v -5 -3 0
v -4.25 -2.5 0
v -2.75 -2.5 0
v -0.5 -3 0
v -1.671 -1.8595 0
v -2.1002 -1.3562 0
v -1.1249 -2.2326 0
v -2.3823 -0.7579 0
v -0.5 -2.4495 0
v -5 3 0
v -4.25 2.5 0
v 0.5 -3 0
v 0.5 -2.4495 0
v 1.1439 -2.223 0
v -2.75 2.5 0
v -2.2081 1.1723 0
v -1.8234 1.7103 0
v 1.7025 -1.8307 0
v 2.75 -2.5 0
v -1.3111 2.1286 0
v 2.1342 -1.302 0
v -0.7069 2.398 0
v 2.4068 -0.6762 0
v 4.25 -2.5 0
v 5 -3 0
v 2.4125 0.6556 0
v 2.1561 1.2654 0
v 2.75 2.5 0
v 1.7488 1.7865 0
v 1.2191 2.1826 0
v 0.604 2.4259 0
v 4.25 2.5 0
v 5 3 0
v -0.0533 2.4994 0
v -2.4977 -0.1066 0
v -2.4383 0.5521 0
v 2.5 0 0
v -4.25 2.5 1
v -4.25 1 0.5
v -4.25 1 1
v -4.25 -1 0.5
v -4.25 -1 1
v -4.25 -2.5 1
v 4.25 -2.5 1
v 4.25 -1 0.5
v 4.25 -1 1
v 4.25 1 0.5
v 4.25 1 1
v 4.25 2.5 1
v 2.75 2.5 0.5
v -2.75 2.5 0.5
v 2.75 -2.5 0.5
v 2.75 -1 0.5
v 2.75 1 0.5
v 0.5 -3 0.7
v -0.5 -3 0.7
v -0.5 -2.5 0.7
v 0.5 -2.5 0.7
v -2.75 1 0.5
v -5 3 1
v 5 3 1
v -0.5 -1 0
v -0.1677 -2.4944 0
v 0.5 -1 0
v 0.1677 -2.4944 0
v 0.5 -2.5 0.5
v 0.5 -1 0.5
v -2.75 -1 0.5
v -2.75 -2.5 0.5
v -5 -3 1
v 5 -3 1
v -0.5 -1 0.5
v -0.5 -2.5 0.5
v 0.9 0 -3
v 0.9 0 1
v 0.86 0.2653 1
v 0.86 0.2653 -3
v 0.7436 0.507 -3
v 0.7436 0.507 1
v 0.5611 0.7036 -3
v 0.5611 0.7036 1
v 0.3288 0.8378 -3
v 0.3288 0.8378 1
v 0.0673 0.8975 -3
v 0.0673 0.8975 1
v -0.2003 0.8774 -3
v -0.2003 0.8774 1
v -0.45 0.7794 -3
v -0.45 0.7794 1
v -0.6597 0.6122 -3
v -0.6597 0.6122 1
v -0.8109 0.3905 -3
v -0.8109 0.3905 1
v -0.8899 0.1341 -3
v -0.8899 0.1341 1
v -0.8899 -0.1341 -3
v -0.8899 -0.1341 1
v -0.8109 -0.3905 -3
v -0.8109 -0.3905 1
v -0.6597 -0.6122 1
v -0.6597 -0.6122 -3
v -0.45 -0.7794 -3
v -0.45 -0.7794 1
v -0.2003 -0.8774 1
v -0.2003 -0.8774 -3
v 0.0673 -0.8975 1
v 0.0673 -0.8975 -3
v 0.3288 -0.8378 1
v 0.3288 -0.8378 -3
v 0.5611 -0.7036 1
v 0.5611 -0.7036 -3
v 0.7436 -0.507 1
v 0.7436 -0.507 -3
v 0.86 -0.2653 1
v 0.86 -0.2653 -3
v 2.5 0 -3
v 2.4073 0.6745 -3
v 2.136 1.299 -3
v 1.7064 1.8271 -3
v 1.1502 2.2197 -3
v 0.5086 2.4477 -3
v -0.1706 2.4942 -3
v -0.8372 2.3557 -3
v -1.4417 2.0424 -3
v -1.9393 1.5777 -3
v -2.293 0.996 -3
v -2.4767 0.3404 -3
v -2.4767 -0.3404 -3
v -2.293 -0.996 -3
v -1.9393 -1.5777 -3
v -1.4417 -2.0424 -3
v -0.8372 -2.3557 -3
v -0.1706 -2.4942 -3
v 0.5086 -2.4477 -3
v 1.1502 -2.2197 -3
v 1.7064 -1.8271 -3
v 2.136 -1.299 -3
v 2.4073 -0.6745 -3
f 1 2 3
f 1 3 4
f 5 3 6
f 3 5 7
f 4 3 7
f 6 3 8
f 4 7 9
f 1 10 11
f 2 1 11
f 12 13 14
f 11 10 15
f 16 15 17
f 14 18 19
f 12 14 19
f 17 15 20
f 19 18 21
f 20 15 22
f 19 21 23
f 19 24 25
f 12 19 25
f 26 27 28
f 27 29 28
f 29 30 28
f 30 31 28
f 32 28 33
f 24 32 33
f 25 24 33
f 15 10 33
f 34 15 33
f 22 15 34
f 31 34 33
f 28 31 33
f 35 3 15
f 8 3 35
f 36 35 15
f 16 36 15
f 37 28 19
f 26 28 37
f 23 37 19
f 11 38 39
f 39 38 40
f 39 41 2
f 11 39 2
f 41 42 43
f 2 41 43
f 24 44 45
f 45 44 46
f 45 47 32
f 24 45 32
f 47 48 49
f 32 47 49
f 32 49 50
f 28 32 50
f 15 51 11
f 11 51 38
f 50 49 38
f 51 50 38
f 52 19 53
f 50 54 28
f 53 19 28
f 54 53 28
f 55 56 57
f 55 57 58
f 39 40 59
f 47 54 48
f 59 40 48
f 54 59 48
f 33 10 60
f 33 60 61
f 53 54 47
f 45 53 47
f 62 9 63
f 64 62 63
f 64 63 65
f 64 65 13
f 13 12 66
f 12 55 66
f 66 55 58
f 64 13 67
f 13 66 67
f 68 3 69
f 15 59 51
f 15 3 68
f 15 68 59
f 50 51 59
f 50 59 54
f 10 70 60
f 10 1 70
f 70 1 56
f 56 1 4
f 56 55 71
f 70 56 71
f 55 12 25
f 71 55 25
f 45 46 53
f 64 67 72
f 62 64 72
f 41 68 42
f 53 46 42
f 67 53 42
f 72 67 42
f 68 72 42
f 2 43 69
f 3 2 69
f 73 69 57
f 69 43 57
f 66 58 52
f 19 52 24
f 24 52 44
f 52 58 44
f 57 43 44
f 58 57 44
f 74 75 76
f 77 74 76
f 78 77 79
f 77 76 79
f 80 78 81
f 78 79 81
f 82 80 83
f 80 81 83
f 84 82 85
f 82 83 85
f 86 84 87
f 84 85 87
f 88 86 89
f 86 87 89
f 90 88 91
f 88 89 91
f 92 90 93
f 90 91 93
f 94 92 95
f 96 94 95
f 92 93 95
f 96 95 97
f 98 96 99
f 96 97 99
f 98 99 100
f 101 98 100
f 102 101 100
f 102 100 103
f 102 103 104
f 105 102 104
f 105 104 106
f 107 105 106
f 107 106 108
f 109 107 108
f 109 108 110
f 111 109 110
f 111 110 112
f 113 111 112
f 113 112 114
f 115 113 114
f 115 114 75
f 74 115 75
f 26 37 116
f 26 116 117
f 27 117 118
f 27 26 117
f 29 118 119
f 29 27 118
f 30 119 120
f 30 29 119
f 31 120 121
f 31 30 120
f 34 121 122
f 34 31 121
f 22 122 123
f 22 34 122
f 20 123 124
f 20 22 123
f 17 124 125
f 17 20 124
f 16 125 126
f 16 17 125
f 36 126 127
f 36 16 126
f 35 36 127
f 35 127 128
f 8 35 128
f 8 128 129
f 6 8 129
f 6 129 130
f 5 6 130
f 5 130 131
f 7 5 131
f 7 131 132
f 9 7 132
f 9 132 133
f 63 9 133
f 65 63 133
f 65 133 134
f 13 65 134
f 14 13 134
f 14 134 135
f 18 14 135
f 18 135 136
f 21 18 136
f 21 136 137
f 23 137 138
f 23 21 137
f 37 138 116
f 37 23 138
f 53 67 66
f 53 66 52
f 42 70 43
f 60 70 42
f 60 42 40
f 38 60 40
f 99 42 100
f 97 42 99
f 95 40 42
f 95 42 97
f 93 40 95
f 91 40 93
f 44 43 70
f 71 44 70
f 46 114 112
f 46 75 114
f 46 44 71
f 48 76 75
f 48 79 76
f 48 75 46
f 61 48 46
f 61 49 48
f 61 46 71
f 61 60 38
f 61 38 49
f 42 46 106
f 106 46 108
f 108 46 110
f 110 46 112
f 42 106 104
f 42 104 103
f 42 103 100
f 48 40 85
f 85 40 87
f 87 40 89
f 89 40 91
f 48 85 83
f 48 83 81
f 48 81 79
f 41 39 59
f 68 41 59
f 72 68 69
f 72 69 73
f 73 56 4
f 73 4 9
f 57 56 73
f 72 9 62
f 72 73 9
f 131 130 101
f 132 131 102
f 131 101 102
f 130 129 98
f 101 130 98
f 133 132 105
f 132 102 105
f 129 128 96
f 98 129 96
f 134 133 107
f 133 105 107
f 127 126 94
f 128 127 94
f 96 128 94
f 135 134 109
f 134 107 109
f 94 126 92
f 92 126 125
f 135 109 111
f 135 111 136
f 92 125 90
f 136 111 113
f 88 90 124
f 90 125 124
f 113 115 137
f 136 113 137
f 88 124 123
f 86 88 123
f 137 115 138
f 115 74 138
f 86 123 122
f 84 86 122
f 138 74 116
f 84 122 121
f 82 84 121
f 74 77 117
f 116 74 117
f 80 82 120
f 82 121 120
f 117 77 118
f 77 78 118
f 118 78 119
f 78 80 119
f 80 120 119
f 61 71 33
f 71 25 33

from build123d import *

# Parameters (mm, degrees)
F0_W      = 10
F0_H      = 6
F0_W_2    = 1.5
F0_H_2    = 5
F1_DEPTH  = 0.5
F2_W      = 10
F2_H      = 6
F3_DEPTH  = 0.5
F5_DEPTH  = 0.5
F6_W      = 1
F6_H      = 0.5
F7_DEPTH  = 2
F8_R      = 2.5
F8_R_2    = 0.9
F9_DEPTH  = 3
F10_R     = 0.9
F11_DEPTH = 4.001
F12_DEPTH = 0.2


with BuildPart() as f1:
    # F0 (on Top) → F1 (new body)
    with BuildSketch(Plane.XY):
        Rectangle(F0_W, F0_H)
        with Locations((-3.5, 0)):
            Rectangle(F0_W_2, F0_H_2, mode=Mode.SUBTRACT)
        with Locations((3.5, 0)):
            Rectangle(F0_W_2, F0_H_2, mode=Mode.SUBTRACT)
    extrude(amount=F1_DEPTH)

    # F2 (on face) → F3 (join)
    with BuildSketch(Plane.XY.offset(0.5)):
        Rectangle(F2_W, F2_H)
    extrude(amount=F3_DEPTH)

    # F4 (on face) → F5 (cut)
    with BuildSketch(Plane.XY.offset(1)):
        Polygon((-4.25, -1), (-4.25, -2.5), (-2.75, -2.5), (2.75, -2.5), (4.25, -2.5), (4.25, -1), align=None)
        Polygon((-4.25, 2.5), (-4.25, 1), (4.25, 1), (4.25, 2.5), (2.75, 2.5), (-2.75, 2.5), align=None)
    extrude(amount=-F5_DEPTH, mode=Mode.SUBTRACT)

    # F6 (on face) → F7 (cut, through all)
    with BuildSketch(Plane.XZ.offset(3)):
        with Locations((0, 0.45)):
            Rectangle(F6_W, F6_H)
    extrude(amount=-F7_DEPTH, mode=Mode.SUBTRACT)

    # F8 (on face) → F9 (join)
    with BuildSketch(Plane.XY):
        Circle(F8_R)
        Circle(F8_R_2, mode=Mode.SUBTRACT)
    extrude(amount=-F9_DEPTH)

    # F10 (on face) → F11 (cut, through all)
    with BuildSketch(Plane.XY.offset(1)):
        Circle(F10_R)
    extrude(amount=-F11_DEPTH, mode=Mode.SUBTRACT)

    # F12 (cut, through all): a face of the model
    f12_faces = [f1.faces().sort_by_distance(p)[0] for p in [
        (0, -2, 0.2),
    ]]
    extrude(f12_faces, amount=-F12_DEPTH, mode=Mode.SUBTRACT)


solid = f1.part
